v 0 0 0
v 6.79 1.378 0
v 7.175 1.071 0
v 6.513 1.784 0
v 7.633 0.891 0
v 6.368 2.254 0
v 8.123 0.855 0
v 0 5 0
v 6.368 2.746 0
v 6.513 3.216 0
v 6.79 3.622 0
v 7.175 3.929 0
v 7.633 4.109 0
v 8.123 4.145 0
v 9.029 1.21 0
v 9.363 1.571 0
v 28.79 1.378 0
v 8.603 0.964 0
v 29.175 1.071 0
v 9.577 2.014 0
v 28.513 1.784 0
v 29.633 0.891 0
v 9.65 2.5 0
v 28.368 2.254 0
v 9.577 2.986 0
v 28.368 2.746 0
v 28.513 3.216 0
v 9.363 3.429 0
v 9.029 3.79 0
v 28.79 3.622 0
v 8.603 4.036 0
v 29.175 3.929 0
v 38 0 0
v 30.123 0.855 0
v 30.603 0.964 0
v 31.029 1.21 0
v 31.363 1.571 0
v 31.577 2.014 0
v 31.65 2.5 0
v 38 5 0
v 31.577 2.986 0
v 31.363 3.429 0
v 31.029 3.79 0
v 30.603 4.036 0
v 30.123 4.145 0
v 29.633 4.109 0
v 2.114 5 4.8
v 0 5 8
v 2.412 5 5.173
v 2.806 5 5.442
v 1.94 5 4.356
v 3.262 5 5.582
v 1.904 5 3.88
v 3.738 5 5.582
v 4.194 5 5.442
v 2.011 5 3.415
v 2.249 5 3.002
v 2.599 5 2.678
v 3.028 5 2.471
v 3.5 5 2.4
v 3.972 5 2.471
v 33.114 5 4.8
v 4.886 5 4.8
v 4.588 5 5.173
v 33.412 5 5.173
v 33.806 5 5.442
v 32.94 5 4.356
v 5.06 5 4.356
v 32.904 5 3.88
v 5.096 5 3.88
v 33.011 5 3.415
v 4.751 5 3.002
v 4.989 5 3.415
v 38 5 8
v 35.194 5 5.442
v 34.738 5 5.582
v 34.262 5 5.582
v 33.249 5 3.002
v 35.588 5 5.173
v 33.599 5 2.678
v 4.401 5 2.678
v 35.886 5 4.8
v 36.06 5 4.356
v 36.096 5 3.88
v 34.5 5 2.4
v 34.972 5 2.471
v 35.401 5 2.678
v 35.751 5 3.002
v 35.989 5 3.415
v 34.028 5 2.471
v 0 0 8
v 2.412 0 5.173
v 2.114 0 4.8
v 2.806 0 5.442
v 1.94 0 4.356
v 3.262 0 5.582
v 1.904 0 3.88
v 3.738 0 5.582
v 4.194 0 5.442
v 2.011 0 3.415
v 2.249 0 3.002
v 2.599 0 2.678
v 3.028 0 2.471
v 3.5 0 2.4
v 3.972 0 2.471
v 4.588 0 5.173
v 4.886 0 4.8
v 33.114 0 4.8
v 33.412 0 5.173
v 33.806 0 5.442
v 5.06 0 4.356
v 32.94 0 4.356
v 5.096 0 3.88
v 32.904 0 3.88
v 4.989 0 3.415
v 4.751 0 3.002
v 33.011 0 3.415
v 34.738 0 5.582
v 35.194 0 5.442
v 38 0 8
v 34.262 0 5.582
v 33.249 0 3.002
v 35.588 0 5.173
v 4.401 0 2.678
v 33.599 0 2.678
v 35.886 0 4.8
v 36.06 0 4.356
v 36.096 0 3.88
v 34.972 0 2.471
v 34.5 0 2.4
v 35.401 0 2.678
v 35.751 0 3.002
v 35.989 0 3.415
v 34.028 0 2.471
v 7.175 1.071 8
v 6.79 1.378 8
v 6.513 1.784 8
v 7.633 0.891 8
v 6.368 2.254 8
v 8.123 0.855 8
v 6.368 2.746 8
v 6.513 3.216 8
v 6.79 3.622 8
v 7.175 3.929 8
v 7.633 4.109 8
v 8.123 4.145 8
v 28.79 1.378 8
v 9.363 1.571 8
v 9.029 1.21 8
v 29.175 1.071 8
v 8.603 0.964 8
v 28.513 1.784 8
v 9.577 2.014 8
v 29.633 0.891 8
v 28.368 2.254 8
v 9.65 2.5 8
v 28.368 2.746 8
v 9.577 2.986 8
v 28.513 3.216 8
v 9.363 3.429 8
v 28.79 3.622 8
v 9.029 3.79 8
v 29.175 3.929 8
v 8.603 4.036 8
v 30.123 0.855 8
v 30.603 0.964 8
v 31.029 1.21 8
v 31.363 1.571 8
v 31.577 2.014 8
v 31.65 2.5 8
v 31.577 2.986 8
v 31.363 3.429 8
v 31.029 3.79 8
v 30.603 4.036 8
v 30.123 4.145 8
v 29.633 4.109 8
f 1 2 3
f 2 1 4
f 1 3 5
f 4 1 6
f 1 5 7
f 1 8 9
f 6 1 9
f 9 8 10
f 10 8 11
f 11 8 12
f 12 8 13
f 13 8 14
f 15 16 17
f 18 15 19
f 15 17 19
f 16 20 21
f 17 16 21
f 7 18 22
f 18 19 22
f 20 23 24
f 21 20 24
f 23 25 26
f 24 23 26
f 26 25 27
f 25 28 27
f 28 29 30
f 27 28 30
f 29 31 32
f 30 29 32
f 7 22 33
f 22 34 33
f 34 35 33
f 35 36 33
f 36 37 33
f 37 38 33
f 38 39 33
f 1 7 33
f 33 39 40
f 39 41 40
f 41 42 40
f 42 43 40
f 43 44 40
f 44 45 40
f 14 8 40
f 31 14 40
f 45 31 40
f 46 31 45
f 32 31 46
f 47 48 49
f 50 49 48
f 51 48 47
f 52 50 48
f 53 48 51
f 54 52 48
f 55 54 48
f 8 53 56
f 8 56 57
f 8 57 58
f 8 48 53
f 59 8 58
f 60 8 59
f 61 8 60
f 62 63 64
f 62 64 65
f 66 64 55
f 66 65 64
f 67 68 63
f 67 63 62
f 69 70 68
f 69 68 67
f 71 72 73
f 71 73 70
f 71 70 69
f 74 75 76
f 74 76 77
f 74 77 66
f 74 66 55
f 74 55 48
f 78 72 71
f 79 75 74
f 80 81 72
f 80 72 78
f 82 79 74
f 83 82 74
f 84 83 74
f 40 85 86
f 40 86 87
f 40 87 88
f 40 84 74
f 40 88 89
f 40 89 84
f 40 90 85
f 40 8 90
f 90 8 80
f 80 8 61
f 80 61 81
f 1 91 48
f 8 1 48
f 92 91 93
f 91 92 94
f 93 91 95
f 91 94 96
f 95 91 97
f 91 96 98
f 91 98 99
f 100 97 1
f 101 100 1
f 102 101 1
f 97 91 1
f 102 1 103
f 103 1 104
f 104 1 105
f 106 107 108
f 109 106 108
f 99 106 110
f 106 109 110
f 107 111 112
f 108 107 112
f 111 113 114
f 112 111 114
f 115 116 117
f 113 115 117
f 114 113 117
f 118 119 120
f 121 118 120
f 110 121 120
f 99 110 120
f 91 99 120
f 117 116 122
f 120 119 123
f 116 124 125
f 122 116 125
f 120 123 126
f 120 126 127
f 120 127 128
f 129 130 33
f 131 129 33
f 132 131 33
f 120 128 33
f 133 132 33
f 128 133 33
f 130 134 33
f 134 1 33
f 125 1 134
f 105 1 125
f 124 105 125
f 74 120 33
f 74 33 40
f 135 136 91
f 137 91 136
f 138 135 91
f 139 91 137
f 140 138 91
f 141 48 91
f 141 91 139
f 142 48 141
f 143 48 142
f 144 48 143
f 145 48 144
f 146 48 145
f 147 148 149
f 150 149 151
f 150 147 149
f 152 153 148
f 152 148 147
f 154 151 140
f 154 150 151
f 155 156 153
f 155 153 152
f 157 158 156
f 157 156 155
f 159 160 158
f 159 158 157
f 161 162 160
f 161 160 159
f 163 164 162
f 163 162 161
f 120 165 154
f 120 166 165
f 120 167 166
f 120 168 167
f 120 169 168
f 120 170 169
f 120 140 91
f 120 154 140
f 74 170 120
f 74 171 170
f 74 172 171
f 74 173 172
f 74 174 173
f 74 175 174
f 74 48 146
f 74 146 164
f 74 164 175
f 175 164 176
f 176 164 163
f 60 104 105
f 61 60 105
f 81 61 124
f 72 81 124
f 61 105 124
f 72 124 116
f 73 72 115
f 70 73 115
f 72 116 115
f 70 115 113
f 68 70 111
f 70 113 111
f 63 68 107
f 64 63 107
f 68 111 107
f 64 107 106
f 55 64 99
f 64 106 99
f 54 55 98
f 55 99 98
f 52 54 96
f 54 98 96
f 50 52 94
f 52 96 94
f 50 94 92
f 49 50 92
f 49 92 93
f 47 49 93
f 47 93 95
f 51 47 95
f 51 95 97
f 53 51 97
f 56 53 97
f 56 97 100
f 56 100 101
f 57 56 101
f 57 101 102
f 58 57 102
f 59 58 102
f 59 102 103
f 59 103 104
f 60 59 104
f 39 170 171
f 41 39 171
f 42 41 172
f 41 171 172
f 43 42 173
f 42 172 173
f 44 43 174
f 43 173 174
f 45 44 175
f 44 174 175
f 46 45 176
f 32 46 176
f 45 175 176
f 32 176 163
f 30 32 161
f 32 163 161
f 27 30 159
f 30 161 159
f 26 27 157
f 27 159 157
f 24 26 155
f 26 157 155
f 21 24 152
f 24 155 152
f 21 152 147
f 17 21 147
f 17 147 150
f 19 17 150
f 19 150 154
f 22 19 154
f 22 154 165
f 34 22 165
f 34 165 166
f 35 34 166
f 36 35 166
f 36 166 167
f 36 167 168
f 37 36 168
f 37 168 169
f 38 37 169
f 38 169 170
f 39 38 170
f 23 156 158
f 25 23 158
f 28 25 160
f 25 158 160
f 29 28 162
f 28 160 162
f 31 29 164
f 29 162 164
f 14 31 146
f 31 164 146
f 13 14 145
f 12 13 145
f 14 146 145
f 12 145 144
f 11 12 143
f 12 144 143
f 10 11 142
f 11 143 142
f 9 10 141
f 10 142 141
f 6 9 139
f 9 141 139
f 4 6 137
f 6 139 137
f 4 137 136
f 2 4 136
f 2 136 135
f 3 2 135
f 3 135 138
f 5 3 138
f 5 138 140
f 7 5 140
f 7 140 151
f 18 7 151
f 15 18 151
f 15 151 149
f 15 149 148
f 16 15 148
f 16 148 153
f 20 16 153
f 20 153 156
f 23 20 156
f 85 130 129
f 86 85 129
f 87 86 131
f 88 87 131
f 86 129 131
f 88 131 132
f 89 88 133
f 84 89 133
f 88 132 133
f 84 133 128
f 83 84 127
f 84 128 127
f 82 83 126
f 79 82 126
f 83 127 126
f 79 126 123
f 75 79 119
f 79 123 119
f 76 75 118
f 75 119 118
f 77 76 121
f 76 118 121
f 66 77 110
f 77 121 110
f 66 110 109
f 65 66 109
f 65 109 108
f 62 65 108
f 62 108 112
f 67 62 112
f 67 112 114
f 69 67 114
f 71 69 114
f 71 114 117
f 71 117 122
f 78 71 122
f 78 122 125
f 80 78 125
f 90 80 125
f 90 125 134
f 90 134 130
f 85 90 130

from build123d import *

# Parameters (mm, degrees)
CROQUIS1_W                          = 38
CROQUIS1_H                          = 5
SALIENTE_EXTRUIR1_DEPTH             = 8
DI_METRO_DE_TALADRO_3_2_3_2_1_D     = 3.2
DI_METRO_DE_TALADRO_3_2_3_2_1_DEPTH = 12
DI_METRO_DE_TALADRO_3_2_3_2_1_TIP   = 0.96137699
TALADRO_ROSCADO_M41_D               = 3.3
TALADRO_ROSCADO_M41_DEPTH           = 8


with BuildPart() as part:
    # Croquis1 → Saliente-Extruir1 (new body)
    with BuildSketch(Plane.XY):
        with Locations((19, 2.5)):
            Rectangle(CROQUIS1_W, CROQUIS1_H)
    extrude(amount=SALIENTE_EXTRUIR1_DEPTH)

    # Diámetro de taladro Ø3.2 (3.2)1
    with Locations(Plane(origin=(3.5, 5, 4), x_dir=(0, 0, 1), z_dir=(0, 1, 0))):
        with Locations((0, 0), (0, 31)):
            Hole(DI_METRO_DE_TALADRO_3_2_3_2_1_D / 2, depth=DI_METRO_DE_TALADRO_3_2_3_2_1_DEPTH)
            with Locations((0, 0, -(DI_METRO_DE_TALADRO_3_2_3_2_1_DEPTH + DI_METRO_DE_TALADRO_3_2_3_2_1_TIP / 2))):  # 118° drill point
                Cone(0, DI_METRO_DE_TALADRO_3_2_3_2_1_D / 2, DI_METRO_DE_TALADRO_3_2_3_2_1_TIP, mode=Mode.SUBTRACT)

    # Taladro roscado M41
    with Locations(Plane(origin=(8, 2.5, 0), x_dir=(-1, 0, 0), z_dir=(0, 0, -1))):
        with Locations((0, 0), (-22, 0)):
            Hole(TALADRO_ROSCADO_M41_D / 2, depth=TALADRO_ROSCADO_M41_DEPTH)


solid = part.part
